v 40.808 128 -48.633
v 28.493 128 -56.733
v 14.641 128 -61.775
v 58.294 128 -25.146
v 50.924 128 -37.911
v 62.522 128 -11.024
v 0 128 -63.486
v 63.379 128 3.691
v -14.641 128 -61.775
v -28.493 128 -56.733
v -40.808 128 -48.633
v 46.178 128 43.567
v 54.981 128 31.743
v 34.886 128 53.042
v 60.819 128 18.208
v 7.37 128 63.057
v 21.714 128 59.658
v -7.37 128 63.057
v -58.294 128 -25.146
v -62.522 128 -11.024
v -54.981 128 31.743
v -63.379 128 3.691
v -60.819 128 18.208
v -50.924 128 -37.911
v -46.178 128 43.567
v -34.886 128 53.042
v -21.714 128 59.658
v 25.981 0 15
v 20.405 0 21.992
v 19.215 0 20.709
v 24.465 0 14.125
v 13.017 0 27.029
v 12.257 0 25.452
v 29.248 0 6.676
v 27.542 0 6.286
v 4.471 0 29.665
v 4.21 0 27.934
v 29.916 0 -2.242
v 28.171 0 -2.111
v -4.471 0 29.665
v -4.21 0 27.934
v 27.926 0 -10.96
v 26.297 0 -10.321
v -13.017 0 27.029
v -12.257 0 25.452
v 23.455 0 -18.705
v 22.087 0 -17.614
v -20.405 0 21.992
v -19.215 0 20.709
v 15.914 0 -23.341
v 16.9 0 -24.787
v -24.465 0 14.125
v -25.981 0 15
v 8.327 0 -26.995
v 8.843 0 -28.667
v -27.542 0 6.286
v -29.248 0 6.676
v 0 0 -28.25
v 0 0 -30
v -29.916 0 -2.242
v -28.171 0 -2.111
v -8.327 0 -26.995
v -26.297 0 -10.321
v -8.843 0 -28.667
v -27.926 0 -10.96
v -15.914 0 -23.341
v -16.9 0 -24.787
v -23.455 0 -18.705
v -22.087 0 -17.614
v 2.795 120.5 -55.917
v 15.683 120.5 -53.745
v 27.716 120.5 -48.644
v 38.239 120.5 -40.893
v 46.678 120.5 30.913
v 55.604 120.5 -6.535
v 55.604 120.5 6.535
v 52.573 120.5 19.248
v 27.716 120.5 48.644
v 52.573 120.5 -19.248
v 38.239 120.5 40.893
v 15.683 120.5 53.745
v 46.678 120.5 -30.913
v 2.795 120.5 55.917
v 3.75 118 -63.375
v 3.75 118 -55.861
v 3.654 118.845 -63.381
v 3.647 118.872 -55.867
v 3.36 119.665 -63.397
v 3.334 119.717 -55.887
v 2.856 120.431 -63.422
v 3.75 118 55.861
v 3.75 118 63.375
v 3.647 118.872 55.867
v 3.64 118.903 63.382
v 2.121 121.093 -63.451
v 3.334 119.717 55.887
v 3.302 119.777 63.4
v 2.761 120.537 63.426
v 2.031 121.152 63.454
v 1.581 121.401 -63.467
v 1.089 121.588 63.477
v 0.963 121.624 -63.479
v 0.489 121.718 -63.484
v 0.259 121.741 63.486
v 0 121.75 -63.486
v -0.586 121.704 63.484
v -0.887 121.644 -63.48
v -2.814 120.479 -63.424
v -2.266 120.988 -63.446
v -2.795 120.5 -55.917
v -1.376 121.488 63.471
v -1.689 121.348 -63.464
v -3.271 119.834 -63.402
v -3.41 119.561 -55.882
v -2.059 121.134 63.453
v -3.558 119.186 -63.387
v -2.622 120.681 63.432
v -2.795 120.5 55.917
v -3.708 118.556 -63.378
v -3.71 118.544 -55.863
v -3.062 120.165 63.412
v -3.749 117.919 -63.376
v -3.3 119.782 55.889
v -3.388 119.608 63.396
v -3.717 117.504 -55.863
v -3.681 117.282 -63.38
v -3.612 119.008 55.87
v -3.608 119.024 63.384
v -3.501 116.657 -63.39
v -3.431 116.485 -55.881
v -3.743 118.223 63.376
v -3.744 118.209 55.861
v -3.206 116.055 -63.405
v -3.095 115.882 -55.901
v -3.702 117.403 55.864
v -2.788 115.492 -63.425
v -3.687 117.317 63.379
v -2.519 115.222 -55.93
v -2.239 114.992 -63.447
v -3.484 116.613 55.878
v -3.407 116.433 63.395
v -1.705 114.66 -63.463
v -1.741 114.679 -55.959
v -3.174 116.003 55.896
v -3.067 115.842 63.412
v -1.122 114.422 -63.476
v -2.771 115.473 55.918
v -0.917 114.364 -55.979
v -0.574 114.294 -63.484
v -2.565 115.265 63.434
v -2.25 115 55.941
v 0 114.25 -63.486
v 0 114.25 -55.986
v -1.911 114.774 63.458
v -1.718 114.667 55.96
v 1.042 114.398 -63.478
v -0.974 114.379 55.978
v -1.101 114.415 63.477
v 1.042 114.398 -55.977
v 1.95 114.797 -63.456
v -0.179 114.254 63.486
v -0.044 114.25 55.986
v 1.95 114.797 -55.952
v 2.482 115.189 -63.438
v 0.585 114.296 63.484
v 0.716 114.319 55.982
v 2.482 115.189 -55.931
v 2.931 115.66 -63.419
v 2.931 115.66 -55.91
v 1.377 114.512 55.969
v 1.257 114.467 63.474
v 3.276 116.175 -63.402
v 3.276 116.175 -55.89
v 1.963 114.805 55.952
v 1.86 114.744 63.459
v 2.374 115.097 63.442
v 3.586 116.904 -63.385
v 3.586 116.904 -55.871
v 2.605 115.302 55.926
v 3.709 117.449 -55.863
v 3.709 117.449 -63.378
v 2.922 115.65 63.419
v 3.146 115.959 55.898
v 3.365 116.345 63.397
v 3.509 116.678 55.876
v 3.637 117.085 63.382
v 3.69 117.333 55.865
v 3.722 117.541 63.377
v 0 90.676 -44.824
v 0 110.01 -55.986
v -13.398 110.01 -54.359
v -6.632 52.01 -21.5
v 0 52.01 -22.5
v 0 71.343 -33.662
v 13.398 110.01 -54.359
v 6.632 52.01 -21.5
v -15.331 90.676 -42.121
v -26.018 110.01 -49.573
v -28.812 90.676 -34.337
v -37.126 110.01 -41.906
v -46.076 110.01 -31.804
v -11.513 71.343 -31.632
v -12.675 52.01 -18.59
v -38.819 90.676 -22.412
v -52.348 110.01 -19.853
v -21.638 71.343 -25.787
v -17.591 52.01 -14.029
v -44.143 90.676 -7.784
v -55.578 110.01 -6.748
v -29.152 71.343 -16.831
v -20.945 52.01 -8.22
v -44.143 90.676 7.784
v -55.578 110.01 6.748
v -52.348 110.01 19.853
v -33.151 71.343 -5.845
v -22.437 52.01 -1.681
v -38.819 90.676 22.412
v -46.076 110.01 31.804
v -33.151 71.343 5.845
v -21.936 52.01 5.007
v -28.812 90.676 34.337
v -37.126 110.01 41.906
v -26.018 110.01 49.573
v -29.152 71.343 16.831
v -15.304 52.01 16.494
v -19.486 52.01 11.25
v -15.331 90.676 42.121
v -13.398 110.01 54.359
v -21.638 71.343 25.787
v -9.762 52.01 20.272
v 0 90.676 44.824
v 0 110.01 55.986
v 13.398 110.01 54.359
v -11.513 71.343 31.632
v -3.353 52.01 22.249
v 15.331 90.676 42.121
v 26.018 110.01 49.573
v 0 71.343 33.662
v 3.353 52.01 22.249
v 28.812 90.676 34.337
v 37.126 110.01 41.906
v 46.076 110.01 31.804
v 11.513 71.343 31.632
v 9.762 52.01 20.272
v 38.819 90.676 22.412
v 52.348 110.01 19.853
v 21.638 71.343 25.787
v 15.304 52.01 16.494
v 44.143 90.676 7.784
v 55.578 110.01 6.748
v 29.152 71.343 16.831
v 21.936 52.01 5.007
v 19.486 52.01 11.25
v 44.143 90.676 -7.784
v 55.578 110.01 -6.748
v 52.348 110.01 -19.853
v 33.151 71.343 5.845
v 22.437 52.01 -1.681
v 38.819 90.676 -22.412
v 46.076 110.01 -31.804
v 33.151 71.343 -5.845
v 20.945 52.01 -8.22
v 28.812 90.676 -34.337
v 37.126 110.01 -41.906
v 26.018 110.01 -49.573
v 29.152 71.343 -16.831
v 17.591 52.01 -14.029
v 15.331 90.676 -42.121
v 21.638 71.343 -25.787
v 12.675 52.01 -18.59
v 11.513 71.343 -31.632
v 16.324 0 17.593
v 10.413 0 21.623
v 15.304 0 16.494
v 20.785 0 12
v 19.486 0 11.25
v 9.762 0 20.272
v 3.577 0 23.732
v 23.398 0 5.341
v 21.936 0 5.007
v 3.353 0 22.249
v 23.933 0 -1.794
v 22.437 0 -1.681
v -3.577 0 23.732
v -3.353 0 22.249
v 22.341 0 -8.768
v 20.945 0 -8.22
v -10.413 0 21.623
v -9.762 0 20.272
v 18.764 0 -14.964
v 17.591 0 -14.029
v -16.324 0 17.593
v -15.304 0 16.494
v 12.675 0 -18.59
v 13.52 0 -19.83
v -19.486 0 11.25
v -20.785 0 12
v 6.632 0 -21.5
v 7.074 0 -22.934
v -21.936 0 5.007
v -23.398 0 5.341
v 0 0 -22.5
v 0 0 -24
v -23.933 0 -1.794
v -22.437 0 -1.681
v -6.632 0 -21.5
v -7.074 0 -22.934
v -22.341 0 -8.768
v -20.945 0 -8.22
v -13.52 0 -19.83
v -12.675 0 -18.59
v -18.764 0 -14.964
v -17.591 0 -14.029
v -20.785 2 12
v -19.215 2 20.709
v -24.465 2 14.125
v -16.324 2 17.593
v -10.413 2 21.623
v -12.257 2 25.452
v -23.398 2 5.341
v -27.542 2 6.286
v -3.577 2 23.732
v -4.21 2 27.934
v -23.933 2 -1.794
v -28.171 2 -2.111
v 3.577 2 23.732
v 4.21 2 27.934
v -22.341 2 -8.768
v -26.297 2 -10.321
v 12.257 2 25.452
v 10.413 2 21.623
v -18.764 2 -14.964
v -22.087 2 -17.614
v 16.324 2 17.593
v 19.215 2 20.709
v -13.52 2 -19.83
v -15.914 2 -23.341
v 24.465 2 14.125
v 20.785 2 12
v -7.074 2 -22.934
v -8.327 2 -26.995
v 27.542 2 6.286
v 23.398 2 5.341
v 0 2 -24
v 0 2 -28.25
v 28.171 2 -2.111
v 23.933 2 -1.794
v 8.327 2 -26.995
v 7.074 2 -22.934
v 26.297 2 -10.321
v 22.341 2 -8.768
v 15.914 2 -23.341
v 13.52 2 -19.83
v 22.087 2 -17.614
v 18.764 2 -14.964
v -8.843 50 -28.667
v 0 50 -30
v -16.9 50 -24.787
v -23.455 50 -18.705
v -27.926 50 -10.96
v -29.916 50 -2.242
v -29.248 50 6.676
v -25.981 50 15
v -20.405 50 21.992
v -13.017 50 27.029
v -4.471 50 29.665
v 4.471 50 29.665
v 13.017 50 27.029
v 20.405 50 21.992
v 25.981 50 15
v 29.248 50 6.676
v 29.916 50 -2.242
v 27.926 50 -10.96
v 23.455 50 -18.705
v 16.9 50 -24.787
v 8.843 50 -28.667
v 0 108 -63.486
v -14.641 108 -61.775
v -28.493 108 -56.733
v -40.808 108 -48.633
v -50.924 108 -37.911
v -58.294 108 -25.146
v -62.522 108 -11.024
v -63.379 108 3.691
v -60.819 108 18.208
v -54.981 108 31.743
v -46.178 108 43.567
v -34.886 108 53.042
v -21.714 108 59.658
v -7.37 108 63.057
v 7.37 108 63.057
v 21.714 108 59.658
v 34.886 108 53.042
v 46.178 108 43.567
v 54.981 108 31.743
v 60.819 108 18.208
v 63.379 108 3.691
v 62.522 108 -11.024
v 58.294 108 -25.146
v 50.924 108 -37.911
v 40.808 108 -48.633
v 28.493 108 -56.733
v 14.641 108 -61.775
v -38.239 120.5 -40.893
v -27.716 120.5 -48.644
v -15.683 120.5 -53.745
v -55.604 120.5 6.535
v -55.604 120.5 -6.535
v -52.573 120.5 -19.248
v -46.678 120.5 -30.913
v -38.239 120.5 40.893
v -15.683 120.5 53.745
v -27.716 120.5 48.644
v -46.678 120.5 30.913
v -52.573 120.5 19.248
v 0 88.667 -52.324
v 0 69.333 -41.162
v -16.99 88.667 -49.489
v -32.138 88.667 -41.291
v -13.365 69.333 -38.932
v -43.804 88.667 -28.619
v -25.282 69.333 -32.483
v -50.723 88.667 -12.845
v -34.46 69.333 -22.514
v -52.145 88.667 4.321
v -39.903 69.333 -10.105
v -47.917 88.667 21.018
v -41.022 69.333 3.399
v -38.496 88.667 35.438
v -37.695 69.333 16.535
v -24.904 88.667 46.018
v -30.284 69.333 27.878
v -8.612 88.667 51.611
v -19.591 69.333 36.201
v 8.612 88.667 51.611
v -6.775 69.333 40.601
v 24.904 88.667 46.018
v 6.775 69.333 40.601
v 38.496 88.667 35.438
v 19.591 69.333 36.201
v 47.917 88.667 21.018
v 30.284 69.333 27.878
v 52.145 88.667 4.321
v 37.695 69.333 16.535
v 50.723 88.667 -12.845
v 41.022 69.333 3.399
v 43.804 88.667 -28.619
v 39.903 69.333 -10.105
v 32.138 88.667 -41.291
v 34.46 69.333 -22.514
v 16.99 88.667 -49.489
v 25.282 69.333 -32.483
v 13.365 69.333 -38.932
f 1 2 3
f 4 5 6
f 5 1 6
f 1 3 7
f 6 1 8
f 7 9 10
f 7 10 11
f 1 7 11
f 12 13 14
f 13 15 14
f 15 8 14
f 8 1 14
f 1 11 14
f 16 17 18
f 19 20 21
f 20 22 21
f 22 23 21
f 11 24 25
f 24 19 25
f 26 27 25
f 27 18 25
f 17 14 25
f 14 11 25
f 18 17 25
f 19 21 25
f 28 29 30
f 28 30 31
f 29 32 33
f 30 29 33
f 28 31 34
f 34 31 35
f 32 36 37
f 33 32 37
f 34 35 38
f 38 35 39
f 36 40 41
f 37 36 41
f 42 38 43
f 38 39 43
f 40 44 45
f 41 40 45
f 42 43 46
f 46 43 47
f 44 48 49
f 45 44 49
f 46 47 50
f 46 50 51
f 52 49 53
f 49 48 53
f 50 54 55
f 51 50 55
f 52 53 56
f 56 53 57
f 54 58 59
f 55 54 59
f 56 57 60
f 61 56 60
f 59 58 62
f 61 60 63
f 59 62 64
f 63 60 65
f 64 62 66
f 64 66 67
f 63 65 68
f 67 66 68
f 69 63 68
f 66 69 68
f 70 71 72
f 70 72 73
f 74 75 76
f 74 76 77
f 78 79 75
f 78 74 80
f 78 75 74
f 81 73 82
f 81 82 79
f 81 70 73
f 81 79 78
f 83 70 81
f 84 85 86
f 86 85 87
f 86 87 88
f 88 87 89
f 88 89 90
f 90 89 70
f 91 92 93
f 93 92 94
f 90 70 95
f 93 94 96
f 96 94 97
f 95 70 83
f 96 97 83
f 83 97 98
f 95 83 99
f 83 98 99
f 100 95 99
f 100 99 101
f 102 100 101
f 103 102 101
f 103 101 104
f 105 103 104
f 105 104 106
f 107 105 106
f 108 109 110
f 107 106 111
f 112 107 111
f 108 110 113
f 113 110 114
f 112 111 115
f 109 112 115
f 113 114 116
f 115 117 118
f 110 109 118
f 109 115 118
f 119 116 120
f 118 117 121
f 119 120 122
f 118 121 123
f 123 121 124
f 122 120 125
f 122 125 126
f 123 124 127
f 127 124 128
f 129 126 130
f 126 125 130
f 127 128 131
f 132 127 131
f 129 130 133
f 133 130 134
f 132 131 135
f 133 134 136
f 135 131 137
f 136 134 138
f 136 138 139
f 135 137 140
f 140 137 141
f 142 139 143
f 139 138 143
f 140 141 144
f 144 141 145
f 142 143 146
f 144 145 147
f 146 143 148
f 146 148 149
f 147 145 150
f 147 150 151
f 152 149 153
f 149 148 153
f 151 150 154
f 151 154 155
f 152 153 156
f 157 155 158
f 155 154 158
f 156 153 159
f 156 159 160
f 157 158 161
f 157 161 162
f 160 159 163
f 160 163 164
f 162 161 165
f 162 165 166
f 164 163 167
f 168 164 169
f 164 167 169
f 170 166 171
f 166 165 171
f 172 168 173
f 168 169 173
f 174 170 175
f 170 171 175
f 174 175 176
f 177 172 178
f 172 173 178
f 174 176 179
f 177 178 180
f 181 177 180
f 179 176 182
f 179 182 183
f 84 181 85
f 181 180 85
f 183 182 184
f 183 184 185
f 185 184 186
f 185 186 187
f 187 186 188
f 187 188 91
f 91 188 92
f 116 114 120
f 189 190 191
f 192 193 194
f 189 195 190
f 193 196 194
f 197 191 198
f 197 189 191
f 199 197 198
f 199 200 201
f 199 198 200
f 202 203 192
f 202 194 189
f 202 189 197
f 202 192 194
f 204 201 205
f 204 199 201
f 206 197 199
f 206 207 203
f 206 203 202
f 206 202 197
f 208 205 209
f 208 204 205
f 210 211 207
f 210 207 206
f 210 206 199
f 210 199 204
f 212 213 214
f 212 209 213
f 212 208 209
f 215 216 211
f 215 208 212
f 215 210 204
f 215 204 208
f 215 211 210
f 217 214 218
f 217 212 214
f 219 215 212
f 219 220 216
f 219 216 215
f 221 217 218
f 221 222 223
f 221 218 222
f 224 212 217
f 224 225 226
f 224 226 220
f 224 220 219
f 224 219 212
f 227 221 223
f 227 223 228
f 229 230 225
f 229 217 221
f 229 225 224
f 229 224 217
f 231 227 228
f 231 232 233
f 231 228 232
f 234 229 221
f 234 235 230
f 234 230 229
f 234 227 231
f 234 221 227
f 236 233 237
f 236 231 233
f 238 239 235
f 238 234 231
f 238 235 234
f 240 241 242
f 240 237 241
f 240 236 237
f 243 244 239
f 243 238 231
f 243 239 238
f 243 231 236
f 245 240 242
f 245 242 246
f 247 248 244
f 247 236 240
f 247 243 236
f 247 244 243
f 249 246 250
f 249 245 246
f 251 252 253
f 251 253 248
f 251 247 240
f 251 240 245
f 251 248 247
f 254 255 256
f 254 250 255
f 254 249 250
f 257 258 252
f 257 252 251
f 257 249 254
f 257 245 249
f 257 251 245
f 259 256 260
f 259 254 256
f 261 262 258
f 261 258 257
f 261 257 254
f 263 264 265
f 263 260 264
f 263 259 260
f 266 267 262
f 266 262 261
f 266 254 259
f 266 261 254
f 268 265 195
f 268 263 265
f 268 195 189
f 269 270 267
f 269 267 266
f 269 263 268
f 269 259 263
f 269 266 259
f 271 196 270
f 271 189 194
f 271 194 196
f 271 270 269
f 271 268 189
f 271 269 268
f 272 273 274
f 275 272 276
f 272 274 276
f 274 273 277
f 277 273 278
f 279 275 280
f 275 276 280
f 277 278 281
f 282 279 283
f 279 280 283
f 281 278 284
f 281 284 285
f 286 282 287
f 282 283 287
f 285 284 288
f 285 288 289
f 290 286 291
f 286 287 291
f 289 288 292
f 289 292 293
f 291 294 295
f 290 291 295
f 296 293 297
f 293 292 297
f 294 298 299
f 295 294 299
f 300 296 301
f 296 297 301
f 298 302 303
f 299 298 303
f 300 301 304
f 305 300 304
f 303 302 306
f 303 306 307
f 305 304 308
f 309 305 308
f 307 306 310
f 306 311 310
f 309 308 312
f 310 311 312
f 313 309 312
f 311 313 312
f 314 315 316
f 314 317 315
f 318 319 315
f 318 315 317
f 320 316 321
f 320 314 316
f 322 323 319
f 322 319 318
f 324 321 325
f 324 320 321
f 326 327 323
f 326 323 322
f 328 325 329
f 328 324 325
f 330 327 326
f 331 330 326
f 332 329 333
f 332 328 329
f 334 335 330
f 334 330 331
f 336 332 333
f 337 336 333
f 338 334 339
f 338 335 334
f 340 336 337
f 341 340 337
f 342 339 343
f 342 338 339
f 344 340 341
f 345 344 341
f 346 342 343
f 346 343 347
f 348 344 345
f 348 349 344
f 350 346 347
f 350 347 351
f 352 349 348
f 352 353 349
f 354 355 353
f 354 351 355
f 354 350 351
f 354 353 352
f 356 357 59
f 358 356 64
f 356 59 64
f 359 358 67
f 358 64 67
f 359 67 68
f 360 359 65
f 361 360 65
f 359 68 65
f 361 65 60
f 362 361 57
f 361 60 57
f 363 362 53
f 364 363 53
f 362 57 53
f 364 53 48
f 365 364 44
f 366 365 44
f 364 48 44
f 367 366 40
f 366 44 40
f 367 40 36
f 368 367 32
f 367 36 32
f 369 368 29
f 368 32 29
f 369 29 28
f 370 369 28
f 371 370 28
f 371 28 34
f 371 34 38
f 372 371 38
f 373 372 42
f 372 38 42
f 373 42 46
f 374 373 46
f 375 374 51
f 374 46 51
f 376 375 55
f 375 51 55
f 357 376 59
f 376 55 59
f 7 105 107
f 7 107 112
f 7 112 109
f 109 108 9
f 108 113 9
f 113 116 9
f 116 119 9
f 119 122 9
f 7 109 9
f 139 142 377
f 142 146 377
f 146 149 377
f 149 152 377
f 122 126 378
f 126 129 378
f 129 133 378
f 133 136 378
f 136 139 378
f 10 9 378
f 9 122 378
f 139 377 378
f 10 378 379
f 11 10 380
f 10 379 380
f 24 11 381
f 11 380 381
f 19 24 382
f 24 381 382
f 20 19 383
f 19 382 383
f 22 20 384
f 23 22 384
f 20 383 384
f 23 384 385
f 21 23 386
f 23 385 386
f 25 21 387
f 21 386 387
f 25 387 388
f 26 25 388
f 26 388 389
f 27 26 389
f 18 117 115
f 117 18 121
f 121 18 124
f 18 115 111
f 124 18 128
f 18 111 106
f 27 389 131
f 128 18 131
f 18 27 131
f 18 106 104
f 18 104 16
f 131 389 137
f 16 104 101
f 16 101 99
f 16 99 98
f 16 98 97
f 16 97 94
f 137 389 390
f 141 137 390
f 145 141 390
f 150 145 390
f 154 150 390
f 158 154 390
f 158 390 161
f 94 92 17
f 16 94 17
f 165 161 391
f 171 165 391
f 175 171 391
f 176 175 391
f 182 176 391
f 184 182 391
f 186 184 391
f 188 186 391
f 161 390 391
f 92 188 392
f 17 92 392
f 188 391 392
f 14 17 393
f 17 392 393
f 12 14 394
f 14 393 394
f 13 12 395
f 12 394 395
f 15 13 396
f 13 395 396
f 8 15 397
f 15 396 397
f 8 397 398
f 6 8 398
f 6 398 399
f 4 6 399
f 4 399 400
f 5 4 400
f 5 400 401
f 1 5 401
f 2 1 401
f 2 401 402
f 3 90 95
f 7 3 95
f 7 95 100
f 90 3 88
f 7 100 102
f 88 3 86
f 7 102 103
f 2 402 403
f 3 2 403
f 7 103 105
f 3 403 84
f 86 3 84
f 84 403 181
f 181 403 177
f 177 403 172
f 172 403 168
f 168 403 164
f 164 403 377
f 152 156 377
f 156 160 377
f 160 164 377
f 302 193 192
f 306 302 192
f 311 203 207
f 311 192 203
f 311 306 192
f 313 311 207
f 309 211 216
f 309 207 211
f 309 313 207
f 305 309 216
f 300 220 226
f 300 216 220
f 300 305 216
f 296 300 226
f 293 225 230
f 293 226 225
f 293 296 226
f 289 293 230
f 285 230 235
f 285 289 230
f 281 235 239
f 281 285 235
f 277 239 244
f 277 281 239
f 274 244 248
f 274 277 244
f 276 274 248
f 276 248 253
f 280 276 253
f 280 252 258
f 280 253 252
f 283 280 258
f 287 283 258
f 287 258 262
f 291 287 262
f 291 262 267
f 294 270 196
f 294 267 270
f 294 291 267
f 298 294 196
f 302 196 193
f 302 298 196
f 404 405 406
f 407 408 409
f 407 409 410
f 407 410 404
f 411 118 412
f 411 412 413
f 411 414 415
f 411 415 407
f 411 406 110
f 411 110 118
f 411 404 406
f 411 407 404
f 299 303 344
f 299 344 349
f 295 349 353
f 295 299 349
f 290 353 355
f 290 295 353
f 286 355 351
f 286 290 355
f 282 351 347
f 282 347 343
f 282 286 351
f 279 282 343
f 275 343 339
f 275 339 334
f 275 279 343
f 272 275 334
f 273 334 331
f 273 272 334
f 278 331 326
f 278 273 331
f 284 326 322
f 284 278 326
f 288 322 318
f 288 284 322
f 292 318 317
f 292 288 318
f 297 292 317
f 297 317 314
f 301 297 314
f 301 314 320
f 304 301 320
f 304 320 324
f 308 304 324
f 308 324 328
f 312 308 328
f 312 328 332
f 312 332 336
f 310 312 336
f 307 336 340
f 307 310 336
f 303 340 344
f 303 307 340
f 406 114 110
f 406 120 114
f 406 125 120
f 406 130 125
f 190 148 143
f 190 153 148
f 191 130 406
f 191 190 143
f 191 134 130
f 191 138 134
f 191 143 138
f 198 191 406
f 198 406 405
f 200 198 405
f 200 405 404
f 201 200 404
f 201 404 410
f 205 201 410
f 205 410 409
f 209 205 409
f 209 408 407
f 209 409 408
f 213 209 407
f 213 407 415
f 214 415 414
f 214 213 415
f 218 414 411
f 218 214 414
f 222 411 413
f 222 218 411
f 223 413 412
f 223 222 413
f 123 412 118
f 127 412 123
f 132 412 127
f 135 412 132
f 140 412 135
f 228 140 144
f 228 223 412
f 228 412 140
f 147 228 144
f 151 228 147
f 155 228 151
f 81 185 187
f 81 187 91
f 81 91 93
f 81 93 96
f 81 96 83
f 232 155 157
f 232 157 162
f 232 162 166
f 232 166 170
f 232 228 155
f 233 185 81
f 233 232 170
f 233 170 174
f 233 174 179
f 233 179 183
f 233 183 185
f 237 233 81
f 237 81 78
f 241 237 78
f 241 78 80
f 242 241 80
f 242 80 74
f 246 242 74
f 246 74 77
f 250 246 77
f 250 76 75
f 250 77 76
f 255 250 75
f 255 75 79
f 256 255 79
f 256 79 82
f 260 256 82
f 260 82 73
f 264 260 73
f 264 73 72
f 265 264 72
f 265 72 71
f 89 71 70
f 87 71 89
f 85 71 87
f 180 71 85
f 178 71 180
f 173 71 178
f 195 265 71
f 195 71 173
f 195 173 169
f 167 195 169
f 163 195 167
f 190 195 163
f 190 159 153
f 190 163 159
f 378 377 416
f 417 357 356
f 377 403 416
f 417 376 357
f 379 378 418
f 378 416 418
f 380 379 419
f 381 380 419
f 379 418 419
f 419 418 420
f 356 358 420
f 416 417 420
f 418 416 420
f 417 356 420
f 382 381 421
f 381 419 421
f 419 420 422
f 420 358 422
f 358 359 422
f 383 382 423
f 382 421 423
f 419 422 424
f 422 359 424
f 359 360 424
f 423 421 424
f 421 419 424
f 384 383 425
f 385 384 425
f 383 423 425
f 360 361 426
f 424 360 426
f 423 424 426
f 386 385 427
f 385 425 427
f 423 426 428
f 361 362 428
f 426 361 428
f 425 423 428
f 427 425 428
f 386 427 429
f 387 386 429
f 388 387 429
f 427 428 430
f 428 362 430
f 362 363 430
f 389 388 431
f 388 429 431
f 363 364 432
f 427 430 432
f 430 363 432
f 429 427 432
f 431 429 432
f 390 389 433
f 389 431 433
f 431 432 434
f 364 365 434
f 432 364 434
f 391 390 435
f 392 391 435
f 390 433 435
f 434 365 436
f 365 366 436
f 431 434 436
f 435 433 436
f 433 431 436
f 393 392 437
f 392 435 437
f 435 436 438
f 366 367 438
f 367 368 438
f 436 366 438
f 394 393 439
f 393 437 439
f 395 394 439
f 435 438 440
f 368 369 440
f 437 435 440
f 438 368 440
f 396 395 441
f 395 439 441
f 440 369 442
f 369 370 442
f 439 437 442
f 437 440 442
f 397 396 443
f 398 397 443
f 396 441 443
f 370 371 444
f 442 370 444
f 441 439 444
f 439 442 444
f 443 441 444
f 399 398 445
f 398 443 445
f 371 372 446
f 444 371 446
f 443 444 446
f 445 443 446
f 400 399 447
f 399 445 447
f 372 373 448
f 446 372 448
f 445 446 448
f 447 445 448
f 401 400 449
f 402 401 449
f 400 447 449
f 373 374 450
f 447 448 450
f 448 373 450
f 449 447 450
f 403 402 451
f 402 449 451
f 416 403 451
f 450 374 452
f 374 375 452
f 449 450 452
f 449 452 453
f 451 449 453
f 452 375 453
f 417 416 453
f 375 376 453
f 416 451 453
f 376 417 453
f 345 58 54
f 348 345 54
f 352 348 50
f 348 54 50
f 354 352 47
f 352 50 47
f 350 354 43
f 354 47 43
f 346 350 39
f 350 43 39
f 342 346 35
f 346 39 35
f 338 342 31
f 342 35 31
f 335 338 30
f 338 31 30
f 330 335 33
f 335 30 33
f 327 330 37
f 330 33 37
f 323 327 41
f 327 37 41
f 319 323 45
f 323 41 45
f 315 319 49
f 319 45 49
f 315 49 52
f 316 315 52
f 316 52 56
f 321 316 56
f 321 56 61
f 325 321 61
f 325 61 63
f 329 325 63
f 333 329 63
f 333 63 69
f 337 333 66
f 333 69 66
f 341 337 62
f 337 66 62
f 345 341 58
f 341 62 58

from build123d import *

# Parameters (mm, degrees)
SHELL1_T           = -7.5
SKETCH2_R          = 28.25
SKETCH2_R_2        = 24
CUT_EXTRUDE1_DEPTH = 2
SKETCH4_R          = 3.75
CUT_EXTRUDE2_DEPTH = 75


with BuildPart() as part:
    # Sketch1 → Revolve1 (revolve)
    with BuildSketch(Plane.XY, mode=Mode.PRIVATE) as revolve1_sk:
        Polygon((0, 0), (0, 88), (0, 128), (-63.486315613, 128), (-63.486315613, 108), (-30, 50), (-30, 0), align=None)
    revolve(revolve1_sk.sketch.rotate(Axis((0, 0, 0), (0, 1, 0)), 270), axis=Axis((0, 0, 0), (0, 1, 0)))

    # Shell1
    shell1_openings = [part.faces().sort_by_distance(p)[0] for p in [
        (0, 0, 0),
    ]]
    offset(amount=SHELL1_T, openings=shell1_openings, kind=Kind.INTERSECTION)

    # Sketch2 → Cut-Extrude1 (cut)
    with BuildSketch(Plane.XZ):
        with Locations(Location((0, 0, 0), (0, 0, 270))):
            Circle(SKETCH2_R)
        with Locations(Location((0, 0, 0), (0, 0, 270))):
            Circle(SKETCH2_R_2, mode=Mode.SUBTRACT)
    extrude(amount=-CUT_EXTRUDE1_DEPTH, mode=Mode.SUBTRACT)

    # Sketch4 → Cut-Extrude2 (cut, symmetric)
    with BuildSketch(Plane.XY):
        with Locations((0, 118)):
            Circle(SKETCH4_R)
    extrude(amount=CUT_EXTRUDE2_DEPTH, both=True, mode=Mode.SUBTRACT)


solid = part.part
